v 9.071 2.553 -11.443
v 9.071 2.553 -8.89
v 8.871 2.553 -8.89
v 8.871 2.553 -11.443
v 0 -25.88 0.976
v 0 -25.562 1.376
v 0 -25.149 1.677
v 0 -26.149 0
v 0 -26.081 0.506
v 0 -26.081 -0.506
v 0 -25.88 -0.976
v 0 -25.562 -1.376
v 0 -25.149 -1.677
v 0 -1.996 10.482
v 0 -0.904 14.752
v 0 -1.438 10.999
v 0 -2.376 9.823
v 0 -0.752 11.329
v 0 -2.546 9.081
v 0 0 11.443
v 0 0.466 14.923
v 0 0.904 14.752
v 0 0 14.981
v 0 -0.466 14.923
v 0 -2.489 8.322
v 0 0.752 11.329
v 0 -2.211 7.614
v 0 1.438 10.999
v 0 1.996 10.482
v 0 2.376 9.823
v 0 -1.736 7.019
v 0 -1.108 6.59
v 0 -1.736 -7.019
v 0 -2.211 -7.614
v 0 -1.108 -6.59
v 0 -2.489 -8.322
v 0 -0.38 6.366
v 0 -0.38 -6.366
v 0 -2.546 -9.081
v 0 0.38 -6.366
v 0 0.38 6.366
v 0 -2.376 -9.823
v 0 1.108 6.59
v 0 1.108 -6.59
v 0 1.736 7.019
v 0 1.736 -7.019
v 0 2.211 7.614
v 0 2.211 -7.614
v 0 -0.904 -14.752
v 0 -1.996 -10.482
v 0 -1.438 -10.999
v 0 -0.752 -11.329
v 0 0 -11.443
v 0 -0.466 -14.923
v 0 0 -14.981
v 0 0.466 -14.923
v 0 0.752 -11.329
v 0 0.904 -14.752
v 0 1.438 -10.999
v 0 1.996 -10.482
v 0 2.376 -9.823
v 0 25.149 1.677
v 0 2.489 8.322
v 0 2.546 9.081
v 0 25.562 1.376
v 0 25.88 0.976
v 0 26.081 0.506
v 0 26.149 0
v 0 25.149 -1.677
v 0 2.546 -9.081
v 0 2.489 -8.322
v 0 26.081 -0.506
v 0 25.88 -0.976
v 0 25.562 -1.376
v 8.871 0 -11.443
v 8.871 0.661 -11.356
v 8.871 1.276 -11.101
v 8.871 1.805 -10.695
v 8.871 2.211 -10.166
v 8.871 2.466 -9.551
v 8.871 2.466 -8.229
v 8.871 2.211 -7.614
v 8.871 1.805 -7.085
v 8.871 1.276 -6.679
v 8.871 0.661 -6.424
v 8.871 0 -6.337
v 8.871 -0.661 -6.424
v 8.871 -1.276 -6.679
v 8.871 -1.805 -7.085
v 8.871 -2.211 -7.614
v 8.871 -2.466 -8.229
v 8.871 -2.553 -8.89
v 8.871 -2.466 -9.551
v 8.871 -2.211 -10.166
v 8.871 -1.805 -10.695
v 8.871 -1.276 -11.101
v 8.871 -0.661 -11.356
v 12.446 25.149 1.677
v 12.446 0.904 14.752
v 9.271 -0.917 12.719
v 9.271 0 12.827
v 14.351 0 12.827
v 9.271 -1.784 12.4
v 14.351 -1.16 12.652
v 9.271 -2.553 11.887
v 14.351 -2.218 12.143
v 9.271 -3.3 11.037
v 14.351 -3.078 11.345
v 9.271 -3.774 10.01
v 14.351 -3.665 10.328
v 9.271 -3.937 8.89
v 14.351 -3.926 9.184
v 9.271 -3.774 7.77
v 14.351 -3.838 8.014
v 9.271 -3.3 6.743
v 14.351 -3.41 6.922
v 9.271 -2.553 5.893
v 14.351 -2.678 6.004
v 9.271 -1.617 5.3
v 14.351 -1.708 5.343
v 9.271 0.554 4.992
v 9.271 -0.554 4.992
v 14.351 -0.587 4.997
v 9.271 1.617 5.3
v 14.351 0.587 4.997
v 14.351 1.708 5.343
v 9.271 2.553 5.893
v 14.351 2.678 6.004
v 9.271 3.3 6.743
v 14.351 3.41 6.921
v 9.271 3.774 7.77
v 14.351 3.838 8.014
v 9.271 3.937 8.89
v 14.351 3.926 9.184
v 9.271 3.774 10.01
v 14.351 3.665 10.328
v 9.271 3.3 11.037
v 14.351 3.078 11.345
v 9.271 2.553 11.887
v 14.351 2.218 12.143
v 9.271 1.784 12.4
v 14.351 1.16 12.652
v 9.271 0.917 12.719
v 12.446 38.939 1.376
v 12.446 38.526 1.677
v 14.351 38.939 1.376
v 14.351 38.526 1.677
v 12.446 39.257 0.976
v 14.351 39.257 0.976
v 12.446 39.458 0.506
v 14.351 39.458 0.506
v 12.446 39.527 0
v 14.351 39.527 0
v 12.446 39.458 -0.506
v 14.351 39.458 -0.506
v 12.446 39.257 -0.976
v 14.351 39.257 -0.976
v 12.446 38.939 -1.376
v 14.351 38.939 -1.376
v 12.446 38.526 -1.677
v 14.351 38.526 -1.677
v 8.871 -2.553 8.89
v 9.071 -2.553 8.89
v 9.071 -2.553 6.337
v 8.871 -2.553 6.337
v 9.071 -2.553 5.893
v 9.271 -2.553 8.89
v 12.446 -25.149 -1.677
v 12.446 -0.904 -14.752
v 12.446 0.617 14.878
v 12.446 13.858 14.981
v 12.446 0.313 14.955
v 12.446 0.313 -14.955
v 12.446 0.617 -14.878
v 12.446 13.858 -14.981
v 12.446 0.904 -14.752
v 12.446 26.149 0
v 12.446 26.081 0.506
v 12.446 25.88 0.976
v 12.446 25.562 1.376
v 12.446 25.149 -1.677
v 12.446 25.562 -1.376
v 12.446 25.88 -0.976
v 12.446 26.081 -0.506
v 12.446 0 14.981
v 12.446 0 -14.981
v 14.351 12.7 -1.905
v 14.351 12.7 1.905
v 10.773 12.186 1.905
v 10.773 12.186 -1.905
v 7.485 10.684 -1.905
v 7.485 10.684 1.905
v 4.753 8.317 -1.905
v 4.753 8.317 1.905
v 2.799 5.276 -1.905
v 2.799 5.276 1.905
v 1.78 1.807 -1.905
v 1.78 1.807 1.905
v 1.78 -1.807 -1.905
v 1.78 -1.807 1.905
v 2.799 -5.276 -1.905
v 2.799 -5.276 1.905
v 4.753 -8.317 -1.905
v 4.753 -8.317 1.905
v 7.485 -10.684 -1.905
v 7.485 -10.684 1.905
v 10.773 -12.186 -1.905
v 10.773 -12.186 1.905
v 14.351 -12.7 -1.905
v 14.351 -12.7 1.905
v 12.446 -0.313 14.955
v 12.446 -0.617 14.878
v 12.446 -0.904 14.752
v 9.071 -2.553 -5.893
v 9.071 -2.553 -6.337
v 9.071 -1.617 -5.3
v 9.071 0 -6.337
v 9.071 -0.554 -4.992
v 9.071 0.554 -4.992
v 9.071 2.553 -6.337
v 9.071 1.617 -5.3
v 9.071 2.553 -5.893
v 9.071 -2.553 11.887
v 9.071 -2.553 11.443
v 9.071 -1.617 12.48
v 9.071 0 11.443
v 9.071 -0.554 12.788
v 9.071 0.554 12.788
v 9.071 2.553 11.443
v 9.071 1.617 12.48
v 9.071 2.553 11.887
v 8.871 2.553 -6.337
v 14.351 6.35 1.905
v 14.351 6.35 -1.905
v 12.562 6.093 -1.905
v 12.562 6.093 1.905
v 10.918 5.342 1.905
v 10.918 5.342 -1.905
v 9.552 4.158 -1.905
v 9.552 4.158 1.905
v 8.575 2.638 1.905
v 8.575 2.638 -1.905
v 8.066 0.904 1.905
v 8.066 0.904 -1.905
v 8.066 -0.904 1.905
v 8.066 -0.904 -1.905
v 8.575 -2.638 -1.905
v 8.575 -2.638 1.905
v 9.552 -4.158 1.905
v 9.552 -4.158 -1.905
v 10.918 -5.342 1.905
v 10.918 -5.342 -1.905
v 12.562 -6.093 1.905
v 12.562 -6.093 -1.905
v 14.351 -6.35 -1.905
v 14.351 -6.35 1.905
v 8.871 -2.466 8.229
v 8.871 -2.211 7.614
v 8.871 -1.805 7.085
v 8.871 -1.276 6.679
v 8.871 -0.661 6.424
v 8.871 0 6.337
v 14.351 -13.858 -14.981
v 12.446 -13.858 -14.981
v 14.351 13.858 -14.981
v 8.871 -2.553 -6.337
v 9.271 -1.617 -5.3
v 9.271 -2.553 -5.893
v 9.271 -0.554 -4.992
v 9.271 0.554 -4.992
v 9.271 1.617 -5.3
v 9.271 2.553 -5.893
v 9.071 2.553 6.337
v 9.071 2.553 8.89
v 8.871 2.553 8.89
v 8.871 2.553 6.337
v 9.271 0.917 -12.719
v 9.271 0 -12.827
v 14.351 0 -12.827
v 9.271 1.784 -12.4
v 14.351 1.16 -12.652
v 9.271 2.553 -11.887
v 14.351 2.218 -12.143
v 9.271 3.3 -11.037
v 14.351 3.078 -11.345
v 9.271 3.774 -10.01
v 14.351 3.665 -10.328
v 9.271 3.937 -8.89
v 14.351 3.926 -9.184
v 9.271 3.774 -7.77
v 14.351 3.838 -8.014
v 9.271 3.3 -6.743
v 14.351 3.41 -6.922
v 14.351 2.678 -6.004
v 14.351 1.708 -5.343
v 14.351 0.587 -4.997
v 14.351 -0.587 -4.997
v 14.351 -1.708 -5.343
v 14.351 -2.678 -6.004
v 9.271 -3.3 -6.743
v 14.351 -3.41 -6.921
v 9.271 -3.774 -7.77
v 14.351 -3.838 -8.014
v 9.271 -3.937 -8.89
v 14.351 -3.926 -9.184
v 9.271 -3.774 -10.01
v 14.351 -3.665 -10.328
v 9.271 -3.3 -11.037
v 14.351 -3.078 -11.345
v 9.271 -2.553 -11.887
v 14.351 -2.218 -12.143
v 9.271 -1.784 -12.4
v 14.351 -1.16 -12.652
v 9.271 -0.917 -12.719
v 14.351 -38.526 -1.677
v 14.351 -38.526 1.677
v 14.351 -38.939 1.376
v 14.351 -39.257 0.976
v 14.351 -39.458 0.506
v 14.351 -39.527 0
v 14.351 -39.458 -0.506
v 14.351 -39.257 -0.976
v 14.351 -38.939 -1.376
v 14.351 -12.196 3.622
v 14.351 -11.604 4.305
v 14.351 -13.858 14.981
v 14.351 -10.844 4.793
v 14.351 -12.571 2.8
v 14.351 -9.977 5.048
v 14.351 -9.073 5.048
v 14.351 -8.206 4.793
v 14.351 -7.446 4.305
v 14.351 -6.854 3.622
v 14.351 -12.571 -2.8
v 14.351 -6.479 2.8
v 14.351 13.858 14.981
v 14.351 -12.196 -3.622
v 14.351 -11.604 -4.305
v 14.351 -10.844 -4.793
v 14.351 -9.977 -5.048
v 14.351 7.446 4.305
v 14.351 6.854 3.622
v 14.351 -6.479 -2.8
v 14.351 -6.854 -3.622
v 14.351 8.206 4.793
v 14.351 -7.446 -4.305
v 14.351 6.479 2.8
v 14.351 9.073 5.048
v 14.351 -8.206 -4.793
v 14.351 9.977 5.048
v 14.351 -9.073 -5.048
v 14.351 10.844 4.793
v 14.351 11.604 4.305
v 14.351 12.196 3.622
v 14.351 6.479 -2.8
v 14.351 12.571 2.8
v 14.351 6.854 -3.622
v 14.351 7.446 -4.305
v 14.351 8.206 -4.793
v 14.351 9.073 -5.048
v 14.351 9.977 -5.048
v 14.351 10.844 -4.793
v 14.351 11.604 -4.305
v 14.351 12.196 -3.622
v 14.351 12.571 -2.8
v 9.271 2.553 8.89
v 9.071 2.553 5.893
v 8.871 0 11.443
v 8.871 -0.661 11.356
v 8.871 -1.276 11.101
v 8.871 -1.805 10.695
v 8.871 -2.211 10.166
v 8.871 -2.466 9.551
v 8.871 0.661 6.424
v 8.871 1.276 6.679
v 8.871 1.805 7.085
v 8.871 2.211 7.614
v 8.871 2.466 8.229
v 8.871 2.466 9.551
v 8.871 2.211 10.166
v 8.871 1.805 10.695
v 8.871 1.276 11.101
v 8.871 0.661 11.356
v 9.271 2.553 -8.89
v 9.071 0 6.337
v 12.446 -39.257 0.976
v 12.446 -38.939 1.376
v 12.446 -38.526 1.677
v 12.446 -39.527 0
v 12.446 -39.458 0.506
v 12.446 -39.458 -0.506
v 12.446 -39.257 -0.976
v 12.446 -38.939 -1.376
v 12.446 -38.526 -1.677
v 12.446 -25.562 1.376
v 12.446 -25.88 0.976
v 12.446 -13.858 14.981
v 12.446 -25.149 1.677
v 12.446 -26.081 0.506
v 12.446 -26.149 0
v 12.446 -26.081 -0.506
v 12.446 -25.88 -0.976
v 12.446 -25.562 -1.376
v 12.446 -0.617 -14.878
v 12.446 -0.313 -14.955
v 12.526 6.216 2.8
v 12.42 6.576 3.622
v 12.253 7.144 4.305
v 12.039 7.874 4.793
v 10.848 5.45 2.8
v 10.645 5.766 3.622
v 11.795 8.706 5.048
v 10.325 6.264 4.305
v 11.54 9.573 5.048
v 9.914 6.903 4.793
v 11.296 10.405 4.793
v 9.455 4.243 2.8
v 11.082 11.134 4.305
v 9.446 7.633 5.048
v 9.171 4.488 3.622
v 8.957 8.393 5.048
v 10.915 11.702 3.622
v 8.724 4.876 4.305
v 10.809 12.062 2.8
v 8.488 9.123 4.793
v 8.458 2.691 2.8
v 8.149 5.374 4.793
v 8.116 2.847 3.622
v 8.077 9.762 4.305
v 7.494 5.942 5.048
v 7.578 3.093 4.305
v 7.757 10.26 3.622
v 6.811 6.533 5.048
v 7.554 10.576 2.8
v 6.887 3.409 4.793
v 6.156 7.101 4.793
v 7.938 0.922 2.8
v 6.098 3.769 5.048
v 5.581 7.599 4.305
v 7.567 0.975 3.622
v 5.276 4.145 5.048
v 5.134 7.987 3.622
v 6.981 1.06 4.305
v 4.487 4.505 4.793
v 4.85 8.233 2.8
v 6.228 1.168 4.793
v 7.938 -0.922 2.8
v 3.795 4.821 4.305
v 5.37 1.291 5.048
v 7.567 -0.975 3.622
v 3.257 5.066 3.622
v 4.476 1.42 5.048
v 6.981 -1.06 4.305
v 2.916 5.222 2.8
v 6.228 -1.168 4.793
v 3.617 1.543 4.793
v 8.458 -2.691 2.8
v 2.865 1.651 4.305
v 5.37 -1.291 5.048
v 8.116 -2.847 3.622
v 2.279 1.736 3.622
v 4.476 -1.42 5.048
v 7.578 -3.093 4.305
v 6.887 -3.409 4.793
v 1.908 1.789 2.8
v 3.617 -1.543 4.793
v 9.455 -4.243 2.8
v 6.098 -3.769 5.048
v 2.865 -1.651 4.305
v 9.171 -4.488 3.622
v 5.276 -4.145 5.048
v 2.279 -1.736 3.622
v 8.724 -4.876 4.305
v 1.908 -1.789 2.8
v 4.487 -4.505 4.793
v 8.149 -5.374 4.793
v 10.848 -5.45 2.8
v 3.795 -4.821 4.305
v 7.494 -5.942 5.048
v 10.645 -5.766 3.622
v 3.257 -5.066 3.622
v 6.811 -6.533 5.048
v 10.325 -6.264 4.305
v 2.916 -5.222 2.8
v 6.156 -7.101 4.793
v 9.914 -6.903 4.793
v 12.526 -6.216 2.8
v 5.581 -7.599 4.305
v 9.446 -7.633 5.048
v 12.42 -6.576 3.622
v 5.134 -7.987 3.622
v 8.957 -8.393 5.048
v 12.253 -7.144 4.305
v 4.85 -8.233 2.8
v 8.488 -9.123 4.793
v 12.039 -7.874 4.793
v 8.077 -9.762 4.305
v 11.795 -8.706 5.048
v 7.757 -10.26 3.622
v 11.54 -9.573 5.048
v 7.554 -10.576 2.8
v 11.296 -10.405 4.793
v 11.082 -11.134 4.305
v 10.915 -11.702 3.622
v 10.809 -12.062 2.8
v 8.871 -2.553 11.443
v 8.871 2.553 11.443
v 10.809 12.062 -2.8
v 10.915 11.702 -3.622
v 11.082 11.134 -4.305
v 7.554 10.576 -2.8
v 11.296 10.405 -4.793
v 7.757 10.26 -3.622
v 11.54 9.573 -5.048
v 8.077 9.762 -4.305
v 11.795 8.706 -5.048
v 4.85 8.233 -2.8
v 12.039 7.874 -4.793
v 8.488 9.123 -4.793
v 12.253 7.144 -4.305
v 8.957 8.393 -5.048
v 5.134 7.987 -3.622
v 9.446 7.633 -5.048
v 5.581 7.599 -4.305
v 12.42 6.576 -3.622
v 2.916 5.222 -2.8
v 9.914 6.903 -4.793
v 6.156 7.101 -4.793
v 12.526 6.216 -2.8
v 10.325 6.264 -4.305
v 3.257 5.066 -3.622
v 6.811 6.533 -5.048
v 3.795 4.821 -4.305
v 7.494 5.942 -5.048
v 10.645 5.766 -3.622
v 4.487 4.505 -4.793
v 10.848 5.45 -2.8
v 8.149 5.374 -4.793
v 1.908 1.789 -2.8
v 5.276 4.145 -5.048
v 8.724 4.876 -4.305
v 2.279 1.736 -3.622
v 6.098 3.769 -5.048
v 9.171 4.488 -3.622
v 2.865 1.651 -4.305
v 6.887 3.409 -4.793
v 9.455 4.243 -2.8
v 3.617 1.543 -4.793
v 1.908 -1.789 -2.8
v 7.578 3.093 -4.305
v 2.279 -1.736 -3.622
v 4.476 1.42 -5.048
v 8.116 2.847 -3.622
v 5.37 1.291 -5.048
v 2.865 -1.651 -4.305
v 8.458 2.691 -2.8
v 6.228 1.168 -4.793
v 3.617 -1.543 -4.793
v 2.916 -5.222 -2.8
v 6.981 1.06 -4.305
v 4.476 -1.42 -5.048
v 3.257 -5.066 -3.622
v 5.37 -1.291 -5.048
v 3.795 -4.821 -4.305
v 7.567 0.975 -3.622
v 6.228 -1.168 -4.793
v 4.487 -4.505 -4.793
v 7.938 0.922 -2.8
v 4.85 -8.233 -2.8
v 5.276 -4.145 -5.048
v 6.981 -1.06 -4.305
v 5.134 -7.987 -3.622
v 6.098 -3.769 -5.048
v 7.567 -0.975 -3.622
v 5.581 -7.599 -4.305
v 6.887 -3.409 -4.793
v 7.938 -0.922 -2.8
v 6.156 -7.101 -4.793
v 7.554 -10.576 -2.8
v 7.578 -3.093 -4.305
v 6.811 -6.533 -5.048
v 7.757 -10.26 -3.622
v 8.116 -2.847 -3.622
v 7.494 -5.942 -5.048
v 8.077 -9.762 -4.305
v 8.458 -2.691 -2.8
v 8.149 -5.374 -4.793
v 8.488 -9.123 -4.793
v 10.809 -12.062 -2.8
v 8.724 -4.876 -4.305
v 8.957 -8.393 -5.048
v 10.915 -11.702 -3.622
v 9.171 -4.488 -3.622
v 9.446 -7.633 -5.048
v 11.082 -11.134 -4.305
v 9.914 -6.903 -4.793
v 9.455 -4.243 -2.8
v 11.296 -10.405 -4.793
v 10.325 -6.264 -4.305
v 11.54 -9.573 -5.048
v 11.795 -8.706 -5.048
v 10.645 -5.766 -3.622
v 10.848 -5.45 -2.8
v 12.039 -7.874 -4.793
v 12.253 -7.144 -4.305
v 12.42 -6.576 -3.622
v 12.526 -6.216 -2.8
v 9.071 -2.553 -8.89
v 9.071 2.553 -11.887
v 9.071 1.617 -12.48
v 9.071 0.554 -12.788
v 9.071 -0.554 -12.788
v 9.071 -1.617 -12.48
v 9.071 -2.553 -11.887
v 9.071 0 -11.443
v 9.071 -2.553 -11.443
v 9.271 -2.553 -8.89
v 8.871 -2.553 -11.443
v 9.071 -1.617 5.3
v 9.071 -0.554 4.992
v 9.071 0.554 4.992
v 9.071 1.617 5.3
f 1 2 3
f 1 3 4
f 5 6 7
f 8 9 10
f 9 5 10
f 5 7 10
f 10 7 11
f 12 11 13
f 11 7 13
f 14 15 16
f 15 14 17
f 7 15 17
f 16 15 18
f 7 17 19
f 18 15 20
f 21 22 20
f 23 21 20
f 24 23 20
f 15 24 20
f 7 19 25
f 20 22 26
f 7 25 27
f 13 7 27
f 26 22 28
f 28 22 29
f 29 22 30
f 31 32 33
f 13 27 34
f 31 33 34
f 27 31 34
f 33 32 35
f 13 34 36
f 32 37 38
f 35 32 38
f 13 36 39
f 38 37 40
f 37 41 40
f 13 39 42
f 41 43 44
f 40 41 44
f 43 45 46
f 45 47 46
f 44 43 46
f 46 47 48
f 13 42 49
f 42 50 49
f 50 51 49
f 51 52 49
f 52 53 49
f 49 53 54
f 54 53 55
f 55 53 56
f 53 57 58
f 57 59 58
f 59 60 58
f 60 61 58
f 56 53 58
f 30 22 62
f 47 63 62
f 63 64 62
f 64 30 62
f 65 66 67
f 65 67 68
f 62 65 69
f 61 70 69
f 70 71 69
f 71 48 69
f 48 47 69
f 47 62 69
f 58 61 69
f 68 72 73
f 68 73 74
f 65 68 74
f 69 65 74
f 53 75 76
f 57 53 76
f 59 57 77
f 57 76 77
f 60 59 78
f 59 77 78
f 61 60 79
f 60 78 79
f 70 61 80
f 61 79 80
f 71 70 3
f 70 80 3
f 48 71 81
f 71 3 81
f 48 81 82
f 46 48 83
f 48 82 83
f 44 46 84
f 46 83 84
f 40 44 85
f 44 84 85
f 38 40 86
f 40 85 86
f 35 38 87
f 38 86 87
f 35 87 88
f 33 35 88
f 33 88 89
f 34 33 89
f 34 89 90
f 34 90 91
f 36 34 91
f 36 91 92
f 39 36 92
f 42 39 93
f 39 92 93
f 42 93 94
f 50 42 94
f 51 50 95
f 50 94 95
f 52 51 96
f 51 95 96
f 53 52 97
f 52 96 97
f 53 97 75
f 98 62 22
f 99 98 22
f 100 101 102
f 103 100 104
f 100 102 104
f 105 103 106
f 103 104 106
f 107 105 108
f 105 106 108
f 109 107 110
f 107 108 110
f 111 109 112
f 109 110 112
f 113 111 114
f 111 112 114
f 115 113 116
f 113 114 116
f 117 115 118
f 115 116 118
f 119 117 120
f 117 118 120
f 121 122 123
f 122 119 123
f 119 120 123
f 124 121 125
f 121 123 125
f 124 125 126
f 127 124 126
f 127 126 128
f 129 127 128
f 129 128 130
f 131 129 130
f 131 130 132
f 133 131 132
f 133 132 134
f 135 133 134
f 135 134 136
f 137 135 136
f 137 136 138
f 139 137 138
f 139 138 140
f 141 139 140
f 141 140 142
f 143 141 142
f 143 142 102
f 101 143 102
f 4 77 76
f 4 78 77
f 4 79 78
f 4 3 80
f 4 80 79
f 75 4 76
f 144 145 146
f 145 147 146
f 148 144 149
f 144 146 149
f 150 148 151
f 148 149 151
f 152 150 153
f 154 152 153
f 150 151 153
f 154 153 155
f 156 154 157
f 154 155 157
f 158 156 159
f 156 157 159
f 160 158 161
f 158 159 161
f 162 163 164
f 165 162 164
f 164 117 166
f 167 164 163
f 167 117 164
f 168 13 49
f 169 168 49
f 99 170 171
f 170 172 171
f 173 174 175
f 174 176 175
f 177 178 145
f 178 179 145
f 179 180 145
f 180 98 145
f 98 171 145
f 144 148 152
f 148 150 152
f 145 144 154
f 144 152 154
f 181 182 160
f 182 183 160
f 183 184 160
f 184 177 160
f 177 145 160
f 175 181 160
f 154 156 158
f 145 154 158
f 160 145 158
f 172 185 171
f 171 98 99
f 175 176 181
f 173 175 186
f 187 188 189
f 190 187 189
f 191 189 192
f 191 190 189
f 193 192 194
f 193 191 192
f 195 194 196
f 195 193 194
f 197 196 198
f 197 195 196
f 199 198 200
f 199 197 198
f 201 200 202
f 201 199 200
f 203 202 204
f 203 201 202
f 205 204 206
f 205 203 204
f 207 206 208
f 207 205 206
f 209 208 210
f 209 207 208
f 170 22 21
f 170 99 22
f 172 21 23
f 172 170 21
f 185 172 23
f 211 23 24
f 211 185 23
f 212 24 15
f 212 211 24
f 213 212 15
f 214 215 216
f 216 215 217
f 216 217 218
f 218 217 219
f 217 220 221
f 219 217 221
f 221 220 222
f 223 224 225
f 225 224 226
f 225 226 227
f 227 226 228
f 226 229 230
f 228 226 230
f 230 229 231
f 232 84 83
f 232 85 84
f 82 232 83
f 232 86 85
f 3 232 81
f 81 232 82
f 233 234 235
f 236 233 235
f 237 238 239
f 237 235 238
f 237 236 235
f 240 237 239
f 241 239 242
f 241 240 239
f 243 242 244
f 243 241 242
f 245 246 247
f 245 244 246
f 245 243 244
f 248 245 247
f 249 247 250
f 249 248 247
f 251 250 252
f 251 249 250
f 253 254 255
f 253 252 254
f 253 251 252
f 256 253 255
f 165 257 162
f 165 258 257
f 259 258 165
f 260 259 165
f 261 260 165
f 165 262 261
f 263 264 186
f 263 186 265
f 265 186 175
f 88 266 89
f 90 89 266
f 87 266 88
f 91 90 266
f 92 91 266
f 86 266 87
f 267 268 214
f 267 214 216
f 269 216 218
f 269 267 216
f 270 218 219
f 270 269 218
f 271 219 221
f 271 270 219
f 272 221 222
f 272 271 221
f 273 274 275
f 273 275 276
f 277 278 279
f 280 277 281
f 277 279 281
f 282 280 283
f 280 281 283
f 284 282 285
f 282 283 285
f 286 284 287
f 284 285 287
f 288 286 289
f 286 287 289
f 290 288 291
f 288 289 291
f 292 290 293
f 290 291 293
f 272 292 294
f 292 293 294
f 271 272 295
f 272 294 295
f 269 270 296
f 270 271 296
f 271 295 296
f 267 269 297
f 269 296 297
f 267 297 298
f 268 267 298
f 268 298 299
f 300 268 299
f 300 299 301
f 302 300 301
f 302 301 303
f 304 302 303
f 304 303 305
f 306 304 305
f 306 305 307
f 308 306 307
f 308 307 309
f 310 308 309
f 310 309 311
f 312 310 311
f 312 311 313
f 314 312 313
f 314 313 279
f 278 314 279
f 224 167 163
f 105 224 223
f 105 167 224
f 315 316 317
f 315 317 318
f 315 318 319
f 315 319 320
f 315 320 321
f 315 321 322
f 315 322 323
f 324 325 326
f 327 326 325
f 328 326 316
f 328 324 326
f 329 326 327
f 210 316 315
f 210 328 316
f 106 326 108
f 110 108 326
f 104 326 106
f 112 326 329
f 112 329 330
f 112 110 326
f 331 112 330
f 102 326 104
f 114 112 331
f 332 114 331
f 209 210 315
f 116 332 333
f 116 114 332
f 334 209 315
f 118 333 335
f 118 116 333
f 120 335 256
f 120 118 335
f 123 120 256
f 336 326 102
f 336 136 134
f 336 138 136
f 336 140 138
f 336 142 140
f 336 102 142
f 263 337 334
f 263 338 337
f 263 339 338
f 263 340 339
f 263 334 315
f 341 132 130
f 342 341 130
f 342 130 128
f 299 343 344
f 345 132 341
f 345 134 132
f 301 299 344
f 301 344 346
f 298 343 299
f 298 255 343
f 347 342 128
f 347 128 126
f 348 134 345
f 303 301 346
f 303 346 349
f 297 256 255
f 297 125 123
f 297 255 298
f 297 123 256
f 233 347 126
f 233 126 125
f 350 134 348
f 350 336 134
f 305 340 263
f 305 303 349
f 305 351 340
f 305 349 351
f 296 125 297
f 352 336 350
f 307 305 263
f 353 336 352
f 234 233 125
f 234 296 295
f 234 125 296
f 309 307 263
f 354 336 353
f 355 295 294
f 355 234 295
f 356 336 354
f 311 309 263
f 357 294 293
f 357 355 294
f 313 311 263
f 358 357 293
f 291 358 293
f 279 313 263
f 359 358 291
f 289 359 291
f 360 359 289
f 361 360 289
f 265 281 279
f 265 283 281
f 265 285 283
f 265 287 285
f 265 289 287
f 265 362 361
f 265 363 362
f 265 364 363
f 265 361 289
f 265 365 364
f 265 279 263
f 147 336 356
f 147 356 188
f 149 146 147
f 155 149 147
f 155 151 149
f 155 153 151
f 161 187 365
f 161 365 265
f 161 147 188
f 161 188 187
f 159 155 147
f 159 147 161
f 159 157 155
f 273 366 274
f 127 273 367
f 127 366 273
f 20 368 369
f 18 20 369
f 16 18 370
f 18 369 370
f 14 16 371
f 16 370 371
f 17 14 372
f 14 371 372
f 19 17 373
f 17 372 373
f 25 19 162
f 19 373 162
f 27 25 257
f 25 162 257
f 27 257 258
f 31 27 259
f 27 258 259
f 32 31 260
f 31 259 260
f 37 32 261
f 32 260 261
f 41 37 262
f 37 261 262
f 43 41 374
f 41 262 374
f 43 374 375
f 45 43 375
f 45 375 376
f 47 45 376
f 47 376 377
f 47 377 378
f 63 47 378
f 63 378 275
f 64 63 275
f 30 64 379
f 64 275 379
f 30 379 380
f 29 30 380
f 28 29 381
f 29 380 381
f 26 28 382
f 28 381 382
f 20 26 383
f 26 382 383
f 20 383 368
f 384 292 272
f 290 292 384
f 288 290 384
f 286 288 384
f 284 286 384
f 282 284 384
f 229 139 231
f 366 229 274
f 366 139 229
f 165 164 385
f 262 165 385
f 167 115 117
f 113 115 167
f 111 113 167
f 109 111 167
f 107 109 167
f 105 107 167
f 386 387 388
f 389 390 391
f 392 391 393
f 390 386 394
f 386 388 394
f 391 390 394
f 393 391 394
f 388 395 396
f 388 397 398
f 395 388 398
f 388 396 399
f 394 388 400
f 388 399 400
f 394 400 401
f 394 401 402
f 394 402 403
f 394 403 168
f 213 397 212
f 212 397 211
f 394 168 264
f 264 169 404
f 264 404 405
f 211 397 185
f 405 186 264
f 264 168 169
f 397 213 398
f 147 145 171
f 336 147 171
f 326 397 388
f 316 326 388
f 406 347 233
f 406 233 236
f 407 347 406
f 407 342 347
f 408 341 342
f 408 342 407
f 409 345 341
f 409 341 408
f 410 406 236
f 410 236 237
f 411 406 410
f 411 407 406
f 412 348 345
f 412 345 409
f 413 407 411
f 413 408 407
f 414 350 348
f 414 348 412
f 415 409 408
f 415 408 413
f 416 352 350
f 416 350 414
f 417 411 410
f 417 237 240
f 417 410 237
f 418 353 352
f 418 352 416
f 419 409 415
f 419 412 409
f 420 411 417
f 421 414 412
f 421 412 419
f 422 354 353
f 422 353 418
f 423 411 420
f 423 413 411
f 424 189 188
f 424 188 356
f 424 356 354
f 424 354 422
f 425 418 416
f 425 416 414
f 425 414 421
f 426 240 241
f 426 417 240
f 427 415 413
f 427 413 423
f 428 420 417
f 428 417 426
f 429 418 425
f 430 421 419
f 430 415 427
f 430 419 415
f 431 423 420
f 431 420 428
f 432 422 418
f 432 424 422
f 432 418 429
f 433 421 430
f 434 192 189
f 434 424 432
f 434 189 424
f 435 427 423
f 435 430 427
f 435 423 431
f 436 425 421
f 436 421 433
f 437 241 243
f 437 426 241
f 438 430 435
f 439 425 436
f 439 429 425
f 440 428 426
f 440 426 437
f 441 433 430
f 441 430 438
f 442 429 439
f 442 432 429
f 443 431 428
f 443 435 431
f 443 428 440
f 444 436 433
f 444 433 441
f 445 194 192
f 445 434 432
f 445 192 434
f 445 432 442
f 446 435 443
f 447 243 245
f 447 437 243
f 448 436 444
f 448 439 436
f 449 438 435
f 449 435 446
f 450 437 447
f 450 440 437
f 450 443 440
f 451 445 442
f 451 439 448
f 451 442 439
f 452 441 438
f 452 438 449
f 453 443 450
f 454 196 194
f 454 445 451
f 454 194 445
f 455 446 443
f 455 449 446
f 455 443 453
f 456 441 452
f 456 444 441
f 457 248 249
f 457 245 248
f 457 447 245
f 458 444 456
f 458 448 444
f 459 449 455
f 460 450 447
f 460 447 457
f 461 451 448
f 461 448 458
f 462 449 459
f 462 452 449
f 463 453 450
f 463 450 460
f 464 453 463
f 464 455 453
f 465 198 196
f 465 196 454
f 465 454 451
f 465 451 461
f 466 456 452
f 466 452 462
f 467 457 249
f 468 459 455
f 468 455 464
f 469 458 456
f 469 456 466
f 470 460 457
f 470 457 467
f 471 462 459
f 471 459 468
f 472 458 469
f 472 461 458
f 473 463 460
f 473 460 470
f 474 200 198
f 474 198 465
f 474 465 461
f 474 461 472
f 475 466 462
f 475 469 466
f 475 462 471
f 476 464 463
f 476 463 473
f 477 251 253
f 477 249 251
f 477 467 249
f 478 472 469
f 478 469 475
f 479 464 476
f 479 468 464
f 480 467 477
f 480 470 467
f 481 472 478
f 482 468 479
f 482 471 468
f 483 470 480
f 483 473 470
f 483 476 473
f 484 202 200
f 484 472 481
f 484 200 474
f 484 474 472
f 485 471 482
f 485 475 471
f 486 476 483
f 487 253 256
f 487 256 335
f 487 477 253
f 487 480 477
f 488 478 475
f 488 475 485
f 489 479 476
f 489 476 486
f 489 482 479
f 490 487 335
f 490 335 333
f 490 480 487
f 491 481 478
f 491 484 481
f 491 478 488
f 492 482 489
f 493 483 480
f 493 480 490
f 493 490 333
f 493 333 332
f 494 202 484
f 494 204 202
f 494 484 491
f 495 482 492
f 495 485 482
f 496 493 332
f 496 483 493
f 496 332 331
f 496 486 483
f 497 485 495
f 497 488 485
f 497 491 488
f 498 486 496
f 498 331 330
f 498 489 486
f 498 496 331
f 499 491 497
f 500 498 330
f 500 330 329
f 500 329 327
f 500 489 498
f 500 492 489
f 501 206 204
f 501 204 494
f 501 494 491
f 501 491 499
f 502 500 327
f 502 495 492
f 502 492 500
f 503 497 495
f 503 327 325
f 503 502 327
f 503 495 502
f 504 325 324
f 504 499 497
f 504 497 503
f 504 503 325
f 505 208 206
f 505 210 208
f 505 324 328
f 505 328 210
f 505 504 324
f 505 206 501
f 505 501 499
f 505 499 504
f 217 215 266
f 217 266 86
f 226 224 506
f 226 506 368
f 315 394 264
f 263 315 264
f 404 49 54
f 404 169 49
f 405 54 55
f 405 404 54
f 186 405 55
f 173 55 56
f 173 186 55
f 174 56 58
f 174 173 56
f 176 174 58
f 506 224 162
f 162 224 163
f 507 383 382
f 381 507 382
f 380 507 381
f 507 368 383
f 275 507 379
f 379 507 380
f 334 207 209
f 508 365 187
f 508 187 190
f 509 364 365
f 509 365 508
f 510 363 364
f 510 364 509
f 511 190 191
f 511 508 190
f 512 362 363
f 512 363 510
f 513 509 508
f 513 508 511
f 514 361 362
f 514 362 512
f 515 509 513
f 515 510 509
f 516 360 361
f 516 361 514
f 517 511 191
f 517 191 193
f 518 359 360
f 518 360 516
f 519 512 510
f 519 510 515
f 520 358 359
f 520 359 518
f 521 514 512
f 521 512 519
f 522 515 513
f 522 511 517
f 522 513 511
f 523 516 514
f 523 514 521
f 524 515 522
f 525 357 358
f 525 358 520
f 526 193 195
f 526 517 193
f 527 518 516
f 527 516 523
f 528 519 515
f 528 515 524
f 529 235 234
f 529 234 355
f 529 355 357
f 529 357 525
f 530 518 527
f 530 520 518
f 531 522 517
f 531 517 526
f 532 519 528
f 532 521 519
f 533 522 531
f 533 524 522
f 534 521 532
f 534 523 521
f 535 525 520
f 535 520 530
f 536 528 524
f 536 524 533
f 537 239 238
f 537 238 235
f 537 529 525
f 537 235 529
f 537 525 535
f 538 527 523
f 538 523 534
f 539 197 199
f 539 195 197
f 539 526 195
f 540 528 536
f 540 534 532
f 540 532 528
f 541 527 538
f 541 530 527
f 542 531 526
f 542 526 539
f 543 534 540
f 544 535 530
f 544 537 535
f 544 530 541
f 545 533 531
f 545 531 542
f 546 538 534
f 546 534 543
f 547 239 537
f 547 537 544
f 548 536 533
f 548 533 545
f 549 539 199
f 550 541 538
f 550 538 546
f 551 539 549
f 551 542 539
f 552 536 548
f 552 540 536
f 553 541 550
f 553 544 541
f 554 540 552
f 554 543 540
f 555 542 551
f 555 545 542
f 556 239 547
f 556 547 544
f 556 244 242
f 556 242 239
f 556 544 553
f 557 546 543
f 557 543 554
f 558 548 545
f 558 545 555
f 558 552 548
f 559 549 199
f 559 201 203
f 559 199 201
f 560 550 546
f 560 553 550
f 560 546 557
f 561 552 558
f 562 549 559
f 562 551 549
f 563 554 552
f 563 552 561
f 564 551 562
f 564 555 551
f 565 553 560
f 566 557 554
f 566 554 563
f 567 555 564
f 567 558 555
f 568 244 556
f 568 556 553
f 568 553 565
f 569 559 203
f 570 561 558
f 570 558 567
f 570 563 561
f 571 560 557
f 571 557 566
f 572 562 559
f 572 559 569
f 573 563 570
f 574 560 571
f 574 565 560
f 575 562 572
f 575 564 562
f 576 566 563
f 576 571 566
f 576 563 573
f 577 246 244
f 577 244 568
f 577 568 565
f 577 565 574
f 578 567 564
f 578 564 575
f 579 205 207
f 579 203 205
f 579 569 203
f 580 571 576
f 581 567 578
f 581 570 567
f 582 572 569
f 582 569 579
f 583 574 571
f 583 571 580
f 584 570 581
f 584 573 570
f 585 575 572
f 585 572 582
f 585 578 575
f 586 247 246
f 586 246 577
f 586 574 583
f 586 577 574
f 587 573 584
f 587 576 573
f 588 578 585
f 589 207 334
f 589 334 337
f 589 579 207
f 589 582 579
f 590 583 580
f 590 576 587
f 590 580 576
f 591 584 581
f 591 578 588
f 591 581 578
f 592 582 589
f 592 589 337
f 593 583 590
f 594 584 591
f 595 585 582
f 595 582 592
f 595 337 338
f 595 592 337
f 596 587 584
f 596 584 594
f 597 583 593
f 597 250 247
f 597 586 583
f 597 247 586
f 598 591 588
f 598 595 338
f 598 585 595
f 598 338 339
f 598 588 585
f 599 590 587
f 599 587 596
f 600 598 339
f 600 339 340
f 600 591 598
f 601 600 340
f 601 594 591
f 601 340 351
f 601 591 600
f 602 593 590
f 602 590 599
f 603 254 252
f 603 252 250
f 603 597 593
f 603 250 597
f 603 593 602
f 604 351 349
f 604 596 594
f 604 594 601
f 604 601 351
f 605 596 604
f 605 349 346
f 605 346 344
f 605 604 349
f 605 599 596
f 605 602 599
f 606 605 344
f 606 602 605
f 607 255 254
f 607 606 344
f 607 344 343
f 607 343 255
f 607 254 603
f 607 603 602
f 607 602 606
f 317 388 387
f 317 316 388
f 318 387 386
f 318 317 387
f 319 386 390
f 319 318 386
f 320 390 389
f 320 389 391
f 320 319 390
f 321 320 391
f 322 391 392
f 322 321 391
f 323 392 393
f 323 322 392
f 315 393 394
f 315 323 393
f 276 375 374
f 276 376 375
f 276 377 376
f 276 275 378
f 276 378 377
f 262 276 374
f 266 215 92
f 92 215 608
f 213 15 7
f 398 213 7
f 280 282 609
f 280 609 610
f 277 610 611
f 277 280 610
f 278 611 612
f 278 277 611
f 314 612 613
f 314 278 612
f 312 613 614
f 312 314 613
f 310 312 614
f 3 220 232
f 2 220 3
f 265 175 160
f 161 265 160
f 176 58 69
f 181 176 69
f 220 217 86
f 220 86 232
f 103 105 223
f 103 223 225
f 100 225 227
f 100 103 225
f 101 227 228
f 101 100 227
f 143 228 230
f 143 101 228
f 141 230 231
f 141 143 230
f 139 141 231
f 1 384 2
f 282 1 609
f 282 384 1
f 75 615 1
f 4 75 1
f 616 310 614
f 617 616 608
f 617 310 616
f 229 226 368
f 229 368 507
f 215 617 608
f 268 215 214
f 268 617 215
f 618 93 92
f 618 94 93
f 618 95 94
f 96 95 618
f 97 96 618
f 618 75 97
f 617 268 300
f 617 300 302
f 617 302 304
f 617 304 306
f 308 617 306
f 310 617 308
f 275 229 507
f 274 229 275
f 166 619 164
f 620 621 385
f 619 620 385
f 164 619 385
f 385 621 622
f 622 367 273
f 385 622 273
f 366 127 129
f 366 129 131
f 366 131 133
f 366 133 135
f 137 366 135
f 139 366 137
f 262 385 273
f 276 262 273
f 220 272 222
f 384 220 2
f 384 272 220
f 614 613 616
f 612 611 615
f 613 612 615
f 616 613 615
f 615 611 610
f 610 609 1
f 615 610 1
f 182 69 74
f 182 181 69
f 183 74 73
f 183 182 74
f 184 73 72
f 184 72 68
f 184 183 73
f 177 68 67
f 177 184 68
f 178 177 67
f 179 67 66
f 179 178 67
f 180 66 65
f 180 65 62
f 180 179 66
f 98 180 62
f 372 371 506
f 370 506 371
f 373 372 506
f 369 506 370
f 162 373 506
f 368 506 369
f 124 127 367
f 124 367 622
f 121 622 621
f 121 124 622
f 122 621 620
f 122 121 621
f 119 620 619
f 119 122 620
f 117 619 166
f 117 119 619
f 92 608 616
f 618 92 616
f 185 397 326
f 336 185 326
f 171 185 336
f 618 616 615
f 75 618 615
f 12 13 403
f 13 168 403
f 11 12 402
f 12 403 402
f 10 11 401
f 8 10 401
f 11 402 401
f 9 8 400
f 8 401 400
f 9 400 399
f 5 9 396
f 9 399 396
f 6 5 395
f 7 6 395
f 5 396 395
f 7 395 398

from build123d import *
from build123d.topology import SkipClean

# Parameters (mm, degrees)
BOSS_EXTRUDE1_DEPTH = 12.446
BOSS_EXTRUDE3_DEPTH = 1.905
FILLET1_R           = 1.905
SKETCH8_R           = 3.937
CUT_EXTRUDE3_DEPTH  = 5.08
SKETCH9_R           = 2.5527
CUT_EXTRUDE4_DEPTH  = 47.270145624
CUT_EXTRUDE7_DEPTH  = 48.009337913
CUT_EXTRUDE8_DEPTH  = 0.2
SKETCH14_W          = 5.1054
SKETCH14_H          = 5.1054
CUT_EXTRUDE9_DEPTH  = 0.2


with BuildPart() as part:
    # Sketch1 → Boss-Extrude1 (new body)
    with BuildSketch(Plane(origin=(0, 0, 0), x_dir=(0, 0, -1), z_dir=(1, 0, 0))):
        Polygon((0, -28.2575), (15.24, 0), (0, 28.2575), (-15.24, 0), align=None)
    extrude(amount=BOSS_EXTRUDE1_DEPTH)

    # Sketch6 → Boss-Extrude3 (add)
    with BuildSketch(Plane(origin=(12.446, 0, 0), x_dir=(0, 0, -1), z_dir=(1, 0, 0))):
        Polygon((-22.454651823, 0), (0, -41.634666921), (22.454651823, 0), (0, 41.634666921), align=None)
    extrude(amount=BOSS_EXTRUDE3_DEPTH)

    # Fillet1
    fillet1_edges = [part.edges().sort_by_distance(p)[0] for p in [
        (13.3985, 41.634666921, 0),
        (13.3985, 0, 22.454651823),
        (13.3985, -41.634666921, 0),
        (13.3985, 0, -22.454651823),
        (6.223, 0, -15.24),
        (6.223, -28.2575, 0),
        (6.223, 0, 15.24),
        (6.223, 28.2575, 0),
    ]]
    fillet(fillet1_edges, radius=FILLET1_R)

    # Sketch7 → Cut-Revolve2 (revolve, cut)
    with BuildSketch(Plane(origin=(0, 0, 0), x_dir=(1, 0, 0), z_dir=(0, 1, 0))):
        with BuildLine():
            Line((1.651, -1.905), (1.651, 1.905))
            ThreePointArc((1.651, 1.905), (4.826, 5.08), (8.001, 1.905))
            Line((8.001, 1.905), (8.001, -1.905))
            ThreePointArc((8.001, -1.905), (4.826, -5.08), (1.651, -1.905))
        make_face()
    revolve(axis=Axis((14.351, 0, 0), (0, 0, 1)), mode=Mode.SUBTRACT)

    # Sketch8 → Cut-Extrude3 (cut)
    with BuildSketch(Plane(origin=(14.351, 0, 0), x_dir=(0, 0, -1), z_dir=(1, 0, 0))):
        with Locations((8.89, 0)):
            Circle(SKETCH8_R)
        with Locations(Location((-8.89, 0, 0), (0, 0, 180))):
            Circle(SKETCH8_R)
    extrude(amount=-CUT_EXTRUDE3_DEPTH, mode=Mode.SUBTRACT)

    # Sketch9 → Cut-Extrude4 (cut, through all)
    with BuildSketch(Plane(origin=(9.271, 0, 0), x_dir=(0, 0, -1), z_dir=(1, 0, 0))):
        with Locations((8.89, 0)):
            Circle(SKETCH9_R)
        with Locations(Location((-8.89, 0, 0), (0, 0, 180))):
            Circle(SKETCH9_R)
    extrude(amount=-CUT_EXTRUDE4_DEPTH, mode=Mode.SUBTRACT)

    # Sketch12 → Cut-Extrude7 (cut, through all)
    with BuildSketch(Plane.ZY.offset(-12.446)):
        with BuildLine():
            Line((-14.980604453, -13.858129497), (-14.980604453, 13.858129497))
            Line((-14.980604453, 13.858129497), (-21.966948415, 0.904283401))
            ThreePointArc((-21.966948415, 0.904283401), (-22.195256276, 0), (-21.966948415, -0.904283401))
            Line((-21.966948415, -0.904283401), (-14.980604453, -13.858129497))
        make_face()
        with BuildLine():
            Line((14.980604453, -13.858129497), (14.980604453, 13.858129497))
            Line((14.980604453, 13.858129497), (21.966948415, 0.904283401))
            ThreePointArc((21.966948415, 0.904283401), (22.195256276, 0), (21.966948415, -0.904283401))
            Line((21.966948415, -0.904283401), (14.980604453, -13.858129497))
        make_face()
    extrude(amount=-CUT_EXTRUDE7_DEPTH, mode=Mode.SUBTRACT)

    # Sketch13 → Cut-Extrude8 (cut)
    with SkipClean():  # the faces are left unmerged after this step: merging them gives an invalid solid
        with BuildSketch(Plane(origin=(9.271, 0, 0), x_dir=(0, 0, -1), z_dir=(1, 0, 0))):
            with BuildLine():
                Line((5.892719281, 2.5527), (11.887280719, 2.5527))
                ThreePointArc((11.887280719, 2.5527), (12.827, 0), (11.887280719, -2.5527))
                Line((11.887280719, -2.5527), (5.892719281, -2.5527))
                ThreePointArc((5.892719281, -2.5527), (4.953, 0), (5.892719281, 2.5527))
            make_face()
            with BuildLine():
                Line((-11.887280719, 2.5527), (-5.892719281, 2.5527))
                ThreePointArc((-5.892719281, 2.5527), (-4.953, 0), (-5.892719281, -2.5527))
                Line((-5.892719281, -2.5527), (-11.887280719, -2.5527))
                ThreePointArc((-11.887280719, -2.5527), (-12.827, 0), (-11.887280719, 2.5527))
            make_face()
        extrude(amount=-CUT_EXTRUDE8_DEPTH, mode=Mode.SUBTRACT)

    # Sketch14 → Cut-Extrude9 (cut)
    with SkipClean():  # the faces are left unmerged after this step: merging them gives an invalid solid
        with BuildSketch(Plane(origin=(9.071, 0, 0), x_dir=(0, 0, -1), z_dir=(1, 0, 0))):
            with Locations((8.89, 0)):
                Rectangle(SKETCH14_W, SKETCH14_H)
            with Locations((-8.89, 0)):
                Rectangle(SKETCH14_W, SKETCH14_H)
        extrude(amount=-CUT_EXTRUDE9_DEPTH, mode=Mode.SUBTRACT)


solid = part.part
